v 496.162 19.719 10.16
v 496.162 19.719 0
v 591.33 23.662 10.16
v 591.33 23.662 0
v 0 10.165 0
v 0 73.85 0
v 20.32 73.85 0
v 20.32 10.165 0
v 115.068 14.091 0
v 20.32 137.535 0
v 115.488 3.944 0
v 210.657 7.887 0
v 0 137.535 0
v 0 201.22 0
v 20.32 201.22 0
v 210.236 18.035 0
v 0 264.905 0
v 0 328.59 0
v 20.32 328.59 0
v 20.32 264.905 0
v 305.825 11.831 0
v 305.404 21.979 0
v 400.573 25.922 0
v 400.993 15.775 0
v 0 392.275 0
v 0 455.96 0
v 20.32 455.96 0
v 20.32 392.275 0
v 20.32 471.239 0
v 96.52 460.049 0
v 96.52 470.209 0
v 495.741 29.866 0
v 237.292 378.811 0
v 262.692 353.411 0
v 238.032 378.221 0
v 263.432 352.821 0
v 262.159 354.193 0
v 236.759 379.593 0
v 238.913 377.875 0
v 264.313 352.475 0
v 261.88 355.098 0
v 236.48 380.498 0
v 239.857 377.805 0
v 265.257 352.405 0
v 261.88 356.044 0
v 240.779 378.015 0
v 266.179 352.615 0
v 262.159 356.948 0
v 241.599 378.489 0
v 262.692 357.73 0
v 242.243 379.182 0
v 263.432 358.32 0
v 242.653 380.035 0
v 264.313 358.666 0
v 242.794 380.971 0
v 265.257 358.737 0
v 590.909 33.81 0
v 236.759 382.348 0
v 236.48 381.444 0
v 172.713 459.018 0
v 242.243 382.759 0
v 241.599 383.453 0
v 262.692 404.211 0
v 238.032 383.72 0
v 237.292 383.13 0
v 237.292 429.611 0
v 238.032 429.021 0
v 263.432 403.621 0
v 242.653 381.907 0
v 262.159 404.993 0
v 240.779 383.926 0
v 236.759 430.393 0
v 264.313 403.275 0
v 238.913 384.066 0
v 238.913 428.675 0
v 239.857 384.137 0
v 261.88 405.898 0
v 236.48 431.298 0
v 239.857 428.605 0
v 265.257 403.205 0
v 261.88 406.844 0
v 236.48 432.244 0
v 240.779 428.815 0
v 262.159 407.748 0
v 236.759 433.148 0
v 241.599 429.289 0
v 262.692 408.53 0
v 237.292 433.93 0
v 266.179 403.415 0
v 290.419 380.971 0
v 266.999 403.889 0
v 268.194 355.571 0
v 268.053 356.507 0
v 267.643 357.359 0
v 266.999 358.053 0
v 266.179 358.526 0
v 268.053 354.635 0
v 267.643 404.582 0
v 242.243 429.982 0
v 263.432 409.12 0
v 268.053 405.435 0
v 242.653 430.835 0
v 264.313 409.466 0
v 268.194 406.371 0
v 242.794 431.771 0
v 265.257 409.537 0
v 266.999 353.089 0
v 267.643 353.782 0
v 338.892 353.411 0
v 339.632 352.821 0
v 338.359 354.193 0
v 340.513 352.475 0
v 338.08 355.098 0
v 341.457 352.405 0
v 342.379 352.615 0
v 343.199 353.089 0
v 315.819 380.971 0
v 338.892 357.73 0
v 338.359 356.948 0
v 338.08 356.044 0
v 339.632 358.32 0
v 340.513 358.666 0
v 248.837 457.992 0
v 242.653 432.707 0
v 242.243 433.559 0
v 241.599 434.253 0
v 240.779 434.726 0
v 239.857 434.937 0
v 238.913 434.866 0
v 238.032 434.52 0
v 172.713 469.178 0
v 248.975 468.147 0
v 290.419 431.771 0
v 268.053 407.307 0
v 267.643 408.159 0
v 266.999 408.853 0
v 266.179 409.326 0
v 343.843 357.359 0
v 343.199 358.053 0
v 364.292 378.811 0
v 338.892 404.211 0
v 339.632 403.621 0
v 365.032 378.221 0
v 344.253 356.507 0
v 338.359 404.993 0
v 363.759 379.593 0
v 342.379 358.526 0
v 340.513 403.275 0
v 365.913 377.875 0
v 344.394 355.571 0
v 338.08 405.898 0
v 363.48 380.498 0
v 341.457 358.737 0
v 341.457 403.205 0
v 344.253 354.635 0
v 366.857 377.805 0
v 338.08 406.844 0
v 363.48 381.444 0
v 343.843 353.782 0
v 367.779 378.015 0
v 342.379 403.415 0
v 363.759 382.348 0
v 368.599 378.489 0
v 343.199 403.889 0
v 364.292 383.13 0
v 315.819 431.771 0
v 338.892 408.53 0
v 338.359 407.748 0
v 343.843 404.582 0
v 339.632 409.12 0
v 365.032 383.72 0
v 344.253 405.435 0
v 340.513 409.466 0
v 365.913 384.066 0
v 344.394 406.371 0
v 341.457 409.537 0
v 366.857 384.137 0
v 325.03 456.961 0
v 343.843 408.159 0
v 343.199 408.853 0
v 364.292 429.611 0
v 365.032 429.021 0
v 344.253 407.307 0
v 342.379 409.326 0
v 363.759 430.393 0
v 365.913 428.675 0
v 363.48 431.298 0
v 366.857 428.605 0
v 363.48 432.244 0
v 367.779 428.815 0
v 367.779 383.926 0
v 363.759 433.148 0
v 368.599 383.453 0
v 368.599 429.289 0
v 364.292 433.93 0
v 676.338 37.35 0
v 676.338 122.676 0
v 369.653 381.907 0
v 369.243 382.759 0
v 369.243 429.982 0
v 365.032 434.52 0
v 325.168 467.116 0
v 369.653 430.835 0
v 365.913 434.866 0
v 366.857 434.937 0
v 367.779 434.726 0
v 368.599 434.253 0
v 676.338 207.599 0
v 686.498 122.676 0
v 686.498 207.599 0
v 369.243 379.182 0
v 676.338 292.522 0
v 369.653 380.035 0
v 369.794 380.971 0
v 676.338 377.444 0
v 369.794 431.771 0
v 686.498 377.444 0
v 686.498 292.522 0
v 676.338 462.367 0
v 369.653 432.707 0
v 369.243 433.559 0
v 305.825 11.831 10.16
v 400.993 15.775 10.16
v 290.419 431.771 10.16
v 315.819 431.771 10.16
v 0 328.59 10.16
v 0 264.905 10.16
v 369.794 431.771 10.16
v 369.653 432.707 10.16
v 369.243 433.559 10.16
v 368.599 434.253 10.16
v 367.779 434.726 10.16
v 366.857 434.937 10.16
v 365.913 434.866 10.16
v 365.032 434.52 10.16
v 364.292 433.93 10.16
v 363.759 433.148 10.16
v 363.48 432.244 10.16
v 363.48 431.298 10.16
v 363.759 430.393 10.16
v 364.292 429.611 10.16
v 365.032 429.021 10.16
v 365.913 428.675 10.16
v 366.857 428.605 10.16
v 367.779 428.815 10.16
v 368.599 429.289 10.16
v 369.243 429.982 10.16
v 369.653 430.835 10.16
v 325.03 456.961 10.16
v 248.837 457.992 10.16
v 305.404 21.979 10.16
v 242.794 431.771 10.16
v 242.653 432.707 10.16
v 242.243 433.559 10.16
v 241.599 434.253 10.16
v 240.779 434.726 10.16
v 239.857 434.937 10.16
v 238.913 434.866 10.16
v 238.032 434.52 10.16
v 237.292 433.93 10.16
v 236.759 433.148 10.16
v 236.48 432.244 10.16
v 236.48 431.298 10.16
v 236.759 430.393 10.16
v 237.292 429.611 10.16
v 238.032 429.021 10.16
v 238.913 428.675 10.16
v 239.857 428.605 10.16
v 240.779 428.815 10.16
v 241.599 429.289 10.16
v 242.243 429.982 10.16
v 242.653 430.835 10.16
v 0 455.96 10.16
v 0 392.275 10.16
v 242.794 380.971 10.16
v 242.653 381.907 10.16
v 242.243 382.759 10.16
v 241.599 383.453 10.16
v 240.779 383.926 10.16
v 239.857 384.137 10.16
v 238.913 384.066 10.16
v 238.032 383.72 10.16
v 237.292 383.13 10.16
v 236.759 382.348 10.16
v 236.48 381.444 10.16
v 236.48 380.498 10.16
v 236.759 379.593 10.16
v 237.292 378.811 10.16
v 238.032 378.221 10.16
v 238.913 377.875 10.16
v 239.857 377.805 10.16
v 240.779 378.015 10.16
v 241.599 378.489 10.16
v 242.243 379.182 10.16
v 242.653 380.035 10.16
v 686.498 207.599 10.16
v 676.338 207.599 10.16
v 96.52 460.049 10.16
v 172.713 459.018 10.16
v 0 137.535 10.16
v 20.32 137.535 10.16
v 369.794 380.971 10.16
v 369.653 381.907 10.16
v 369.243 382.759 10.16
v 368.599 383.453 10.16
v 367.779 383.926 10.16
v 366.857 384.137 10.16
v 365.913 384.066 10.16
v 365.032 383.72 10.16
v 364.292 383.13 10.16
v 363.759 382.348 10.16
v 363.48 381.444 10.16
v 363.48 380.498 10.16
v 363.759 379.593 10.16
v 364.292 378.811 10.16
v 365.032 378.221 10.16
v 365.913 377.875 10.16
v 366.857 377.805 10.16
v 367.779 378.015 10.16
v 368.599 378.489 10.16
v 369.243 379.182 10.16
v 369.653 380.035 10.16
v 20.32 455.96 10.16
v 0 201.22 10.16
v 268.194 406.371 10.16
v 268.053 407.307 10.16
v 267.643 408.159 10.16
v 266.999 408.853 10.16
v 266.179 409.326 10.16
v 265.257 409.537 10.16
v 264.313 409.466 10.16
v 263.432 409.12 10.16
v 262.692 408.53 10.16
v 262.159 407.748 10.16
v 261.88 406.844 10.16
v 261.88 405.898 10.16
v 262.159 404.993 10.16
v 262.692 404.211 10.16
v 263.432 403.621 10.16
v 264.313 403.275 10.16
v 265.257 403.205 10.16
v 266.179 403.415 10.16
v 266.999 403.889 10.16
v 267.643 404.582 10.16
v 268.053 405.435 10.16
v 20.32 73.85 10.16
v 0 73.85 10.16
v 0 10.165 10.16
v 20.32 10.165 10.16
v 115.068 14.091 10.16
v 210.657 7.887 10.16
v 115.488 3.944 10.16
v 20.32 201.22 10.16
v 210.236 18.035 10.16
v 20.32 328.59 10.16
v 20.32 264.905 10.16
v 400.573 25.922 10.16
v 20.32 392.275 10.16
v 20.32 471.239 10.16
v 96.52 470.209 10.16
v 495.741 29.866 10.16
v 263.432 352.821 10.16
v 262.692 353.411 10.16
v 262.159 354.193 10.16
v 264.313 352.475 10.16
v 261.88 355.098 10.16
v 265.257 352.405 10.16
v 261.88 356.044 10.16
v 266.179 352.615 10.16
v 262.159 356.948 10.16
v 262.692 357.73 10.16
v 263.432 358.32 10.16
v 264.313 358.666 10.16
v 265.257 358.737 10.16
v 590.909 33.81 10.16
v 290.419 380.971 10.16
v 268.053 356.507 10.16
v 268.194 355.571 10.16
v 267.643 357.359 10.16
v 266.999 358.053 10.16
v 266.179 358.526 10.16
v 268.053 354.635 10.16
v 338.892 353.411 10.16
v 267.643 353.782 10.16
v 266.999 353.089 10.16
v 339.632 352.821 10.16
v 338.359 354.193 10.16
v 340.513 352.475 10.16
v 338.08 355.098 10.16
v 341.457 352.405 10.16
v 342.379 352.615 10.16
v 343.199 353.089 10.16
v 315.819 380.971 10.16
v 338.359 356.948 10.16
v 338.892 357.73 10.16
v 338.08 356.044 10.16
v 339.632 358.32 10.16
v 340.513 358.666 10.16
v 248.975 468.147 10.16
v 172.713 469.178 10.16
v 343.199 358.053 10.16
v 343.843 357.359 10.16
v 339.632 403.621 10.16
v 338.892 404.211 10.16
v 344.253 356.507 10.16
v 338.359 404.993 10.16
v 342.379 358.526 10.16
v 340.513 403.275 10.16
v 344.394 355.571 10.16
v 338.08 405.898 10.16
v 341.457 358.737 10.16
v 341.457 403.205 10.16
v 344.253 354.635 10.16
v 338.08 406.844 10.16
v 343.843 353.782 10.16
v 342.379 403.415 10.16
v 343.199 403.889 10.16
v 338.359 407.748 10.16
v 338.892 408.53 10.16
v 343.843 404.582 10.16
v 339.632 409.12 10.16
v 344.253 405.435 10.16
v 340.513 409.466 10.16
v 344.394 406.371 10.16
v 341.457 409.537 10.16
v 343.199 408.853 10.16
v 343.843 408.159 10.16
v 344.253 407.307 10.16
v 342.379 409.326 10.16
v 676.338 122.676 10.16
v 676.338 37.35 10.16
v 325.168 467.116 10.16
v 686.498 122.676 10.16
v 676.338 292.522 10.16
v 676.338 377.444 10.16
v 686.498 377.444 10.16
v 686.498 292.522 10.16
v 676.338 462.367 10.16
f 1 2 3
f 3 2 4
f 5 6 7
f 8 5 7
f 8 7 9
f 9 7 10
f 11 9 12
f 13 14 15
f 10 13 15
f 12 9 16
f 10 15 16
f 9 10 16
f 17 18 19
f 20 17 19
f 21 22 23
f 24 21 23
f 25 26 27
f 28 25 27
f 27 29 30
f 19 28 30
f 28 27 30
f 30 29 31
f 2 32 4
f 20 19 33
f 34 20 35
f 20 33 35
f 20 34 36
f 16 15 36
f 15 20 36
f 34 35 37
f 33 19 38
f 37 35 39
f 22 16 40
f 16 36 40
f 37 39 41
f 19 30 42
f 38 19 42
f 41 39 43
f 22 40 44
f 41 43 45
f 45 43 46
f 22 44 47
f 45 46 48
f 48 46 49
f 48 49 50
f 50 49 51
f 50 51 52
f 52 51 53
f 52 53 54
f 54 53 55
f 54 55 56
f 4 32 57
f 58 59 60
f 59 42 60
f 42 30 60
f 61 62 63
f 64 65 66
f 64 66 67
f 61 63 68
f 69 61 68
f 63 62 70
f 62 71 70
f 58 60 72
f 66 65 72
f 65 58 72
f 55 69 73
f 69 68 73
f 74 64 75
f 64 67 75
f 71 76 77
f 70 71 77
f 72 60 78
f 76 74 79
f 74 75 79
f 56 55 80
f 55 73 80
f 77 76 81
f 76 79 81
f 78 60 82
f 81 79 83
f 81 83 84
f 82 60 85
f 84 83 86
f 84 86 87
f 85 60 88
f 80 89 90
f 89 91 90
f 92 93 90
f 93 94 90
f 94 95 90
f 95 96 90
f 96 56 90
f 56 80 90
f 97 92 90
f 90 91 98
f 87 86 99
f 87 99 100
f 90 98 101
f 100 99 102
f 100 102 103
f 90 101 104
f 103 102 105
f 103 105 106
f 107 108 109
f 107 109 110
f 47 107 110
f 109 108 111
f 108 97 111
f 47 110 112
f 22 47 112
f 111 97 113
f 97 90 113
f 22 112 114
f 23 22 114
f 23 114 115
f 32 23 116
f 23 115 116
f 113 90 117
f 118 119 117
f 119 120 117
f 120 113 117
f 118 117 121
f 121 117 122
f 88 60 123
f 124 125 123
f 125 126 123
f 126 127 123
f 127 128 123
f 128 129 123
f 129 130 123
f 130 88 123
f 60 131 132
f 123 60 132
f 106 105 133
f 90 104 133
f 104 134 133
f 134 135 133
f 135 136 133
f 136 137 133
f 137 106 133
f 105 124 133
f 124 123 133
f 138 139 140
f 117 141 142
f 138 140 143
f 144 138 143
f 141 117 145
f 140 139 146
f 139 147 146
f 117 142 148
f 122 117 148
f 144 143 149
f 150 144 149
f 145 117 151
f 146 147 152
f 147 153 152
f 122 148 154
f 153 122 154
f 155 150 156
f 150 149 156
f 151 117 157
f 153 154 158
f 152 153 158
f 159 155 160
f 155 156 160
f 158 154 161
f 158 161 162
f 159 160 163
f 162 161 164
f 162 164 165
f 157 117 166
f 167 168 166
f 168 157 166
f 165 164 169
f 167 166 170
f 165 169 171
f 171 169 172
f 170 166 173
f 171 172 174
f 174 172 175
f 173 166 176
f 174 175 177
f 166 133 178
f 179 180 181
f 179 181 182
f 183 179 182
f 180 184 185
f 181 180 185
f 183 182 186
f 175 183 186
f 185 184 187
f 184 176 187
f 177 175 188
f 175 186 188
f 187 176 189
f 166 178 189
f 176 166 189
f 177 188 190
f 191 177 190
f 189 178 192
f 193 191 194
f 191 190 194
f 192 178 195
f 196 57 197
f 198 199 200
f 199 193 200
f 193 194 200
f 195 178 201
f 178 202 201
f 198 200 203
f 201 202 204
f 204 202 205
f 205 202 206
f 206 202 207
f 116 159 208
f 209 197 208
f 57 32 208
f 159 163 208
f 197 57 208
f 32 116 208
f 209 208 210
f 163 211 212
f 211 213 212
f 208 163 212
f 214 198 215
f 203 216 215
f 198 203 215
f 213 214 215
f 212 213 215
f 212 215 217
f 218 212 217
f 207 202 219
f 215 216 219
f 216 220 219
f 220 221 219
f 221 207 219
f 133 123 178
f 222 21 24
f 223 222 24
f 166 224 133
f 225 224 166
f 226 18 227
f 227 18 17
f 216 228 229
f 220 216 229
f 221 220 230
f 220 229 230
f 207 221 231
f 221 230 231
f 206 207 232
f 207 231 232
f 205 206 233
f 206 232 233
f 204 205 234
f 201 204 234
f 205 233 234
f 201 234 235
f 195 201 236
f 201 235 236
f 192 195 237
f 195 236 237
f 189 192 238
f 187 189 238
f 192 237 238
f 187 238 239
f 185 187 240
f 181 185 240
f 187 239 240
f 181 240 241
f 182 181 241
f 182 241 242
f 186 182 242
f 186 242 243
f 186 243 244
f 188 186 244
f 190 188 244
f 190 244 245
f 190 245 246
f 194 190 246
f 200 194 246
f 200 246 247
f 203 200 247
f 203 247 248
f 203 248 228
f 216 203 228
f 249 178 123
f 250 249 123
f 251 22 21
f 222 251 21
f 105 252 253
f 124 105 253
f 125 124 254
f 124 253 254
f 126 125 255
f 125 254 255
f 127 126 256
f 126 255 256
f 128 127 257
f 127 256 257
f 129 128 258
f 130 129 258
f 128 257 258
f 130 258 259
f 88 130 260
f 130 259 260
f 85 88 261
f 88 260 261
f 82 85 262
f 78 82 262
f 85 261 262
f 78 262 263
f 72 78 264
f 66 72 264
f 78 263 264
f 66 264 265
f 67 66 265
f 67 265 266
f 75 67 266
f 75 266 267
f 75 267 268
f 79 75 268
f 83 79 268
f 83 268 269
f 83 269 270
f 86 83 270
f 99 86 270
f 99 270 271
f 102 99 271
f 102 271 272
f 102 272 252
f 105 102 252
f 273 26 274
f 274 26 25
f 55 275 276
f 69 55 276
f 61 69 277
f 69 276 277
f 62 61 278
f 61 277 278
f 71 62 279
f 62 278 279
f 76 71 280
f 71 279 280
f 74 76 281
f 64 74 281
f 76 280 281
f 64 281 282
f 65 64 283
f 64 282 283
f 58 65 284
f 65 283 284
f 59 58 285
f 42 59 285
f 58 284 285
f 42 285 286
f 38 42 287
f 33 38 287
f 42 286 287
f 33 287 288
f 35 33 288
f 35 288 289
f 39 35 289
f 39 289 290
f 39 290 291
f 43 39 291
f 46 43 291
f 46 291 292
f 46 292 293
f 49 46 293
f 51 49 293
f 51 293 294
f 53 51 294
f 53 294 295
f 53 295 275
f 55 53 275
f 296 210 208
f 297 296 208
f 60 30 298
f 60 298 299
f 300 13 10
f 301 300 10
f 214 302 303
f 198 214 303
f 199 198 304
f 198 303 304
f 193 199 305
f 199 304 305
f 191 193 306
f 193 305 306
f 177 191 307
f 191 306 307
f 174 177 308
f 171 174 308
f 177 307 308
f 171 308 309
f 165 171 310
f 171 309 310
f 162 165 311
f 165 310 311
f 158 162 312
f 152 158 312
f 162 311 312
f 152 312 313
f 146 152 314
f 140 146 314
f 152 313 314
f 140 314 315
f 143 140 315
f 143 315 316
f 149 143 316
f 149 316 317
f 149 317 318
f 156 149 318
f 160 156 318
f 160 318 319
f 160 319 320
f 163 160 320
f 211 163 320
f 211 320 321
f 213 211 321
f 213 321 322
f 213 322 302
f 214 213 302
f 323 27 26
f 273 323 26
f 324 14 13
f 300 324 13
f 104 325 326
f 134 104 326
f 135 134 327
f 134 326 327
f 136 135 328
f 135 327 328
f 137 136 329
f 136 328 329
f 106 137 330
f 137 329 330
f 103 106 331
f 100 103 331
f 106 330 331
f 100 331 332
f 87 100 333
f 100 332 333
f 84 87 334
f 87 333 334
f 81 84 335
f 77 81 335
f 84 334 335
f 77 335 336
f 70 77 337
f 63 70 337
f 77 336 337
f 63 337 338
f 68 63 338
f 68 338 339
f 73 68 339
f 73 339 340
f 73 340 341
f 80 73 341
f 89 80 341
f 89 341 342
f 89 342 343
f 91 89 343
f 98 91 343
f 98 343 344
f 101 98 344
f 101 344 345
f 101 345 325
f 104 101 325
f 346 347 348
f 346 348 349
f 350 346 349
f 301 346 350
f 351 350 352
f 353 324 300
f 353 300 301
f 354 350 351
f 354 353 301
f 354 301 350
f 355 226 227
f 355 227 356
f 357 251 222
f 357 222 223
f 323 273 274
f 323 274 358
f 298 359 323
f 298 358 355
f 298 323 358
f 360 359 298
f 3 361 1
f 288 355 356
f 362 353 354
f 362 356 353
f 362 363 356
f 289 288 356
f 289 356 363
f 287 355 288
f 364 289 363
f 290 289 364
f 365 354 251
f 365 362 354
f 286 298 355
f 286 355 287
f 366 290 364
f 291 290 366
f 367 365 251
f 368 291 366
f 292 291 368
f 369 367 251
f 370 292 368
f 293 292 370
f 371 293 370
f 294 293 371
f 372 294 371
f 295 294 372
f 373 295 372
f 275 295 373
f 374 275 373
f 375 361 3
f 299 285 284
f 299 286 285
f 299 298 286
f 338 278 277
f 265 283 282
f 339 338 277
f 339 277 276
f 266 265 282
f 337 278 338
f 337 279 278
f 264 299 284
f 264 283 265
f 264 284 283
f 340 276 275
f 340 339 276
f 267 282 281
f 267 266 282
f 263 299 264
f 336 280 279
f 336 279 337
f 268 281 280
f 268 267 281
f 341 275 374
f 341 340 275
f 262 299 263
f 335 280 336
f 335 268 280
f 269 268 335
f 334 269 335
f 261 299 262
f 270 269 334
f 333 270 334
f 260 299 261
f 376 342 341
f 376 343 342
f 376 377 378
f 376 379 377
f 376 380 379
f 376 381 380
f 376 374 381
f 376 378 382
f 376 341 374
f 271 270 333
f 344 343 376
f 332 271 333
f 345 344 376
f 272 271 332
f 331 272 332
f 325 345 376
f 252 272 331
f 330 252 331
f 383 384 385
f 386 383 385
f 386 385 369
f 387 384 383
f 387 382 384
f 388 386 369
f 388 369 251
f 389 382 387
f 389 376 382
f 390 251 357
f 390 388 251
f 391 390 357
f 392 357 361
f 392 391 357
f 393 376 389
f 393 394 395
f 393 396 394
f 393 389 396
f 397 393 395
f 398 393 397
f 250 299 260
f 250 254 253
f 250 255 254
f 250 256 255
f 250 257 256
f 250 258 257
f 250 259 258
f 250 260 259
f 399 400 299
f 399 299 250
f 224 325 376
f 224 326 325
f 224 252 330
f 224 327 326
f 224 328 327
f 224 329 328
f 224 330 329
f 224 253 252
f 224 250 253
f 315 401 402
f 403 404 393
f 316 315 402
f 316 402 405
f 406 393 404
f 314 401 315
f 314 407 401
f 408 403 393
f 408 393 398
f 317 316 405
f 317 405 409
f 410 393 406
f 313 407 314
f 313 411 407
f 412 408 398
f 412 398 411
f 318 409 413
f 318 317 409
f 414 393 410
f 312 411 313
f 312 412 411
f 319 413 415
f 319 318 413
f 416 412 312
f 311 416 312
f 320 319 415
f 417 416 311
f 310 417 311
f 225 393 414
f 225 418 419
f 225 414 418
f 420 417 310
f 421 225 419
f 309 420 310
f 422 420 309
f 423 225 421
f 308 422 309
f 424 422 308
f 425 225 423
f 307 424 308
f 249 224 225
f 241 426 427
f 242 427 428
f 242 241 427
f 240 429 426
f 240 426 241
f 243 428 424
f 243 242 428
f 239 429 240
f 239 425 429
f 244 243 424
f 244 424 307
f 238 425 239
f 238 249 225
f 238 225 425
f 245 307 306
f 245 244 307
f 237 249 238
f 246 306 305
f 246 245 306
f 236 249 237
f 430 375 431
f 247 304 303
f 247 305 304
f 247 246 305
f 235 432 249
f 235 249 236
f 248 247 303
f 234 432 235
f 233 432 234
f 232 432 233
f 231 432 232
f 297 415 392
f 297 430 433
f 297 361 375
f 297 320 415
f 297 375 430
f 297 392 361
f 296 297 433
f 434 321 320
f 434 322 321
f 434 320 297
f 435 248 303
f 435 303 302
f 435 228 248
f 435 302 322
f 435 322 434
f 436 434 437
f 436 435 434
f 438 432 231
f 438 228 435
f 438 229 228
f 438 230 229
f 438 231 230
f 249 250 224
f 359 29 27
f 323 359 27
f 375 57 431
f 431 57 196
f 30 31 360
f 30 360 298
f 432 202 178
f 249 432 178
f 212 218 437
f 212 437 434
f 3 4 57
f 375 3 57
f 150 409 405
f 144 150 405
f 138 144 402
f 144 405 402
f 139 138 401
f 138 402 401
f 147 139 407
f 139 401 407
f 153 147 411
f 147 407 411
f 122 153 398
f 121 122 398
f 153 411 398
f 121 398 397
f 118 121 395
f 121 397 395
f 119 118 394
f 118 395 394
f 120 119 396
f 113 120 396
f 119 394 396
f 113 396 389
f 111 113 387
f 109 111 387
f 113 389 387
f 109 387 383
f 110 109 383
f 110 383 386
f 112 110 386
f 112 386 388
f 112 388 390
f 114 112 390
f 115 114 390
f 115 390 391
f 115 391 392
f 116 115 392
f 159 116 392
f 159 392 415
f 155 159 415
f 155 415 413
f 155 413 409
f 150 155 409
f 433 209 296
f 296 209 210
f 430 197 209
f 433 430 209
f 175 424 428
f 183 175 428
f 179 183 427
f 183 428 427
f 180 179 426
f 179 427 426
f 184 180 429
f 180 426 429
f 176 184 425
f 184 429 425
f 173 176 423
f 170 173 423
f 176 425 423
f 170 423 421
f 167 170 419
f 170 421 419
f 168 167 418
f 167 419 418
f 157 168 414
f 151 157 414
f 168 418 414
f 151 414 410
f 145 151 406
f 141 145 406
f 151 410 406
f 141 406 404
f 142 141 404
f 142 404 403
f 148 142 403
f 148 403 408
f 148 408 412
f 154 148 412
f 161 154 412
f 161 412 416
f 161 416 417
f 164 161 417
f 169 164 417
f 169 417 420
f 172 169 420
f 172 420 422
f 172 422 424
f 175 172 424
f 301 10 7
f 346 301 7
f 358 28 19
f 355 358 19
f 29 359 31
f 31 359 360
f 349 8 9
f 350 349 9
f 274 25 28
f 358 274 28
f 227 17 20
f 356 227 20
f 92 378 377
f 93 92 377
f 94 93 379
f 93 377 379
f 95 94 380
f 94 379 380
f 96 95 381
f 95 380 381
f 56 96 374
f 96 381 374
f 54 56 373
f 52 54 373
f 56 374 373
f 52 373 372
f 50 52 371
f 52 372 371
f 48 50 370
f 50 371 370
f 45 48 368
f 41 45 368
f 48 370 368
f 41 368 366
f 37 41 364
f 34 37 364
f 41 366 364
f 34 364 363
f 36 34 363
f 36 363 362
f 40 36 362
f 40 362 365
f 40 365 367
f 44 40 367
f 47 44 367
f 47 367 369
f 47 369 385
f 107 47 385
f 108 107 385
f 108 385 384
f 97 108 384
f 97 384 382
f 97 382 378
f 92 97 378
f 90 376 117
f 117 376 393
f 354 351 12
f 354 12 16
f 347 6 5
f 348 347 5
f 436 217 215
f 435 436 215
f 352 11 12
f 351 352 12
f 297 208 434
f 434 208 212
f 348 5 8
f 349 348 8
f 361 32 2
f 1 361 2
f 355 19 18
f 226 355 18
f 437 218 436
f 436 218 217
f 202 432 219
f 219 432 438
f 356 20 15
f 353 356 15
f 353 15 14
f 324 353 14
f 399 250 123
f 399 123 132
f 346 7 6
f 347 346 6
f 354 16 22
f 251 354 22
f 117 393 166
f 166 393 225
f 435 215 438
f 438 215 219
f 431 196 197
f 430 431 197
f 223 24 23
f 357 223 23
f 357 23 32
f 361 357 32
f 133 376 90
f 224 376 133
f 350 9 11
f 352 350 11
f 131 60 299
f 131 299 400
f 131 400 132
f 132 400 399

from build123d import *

# Parameters (mm, degrees)
BOSS_EXTRUDE1_DEPTH = 10.16
CUT_EXTRUDE1_DEPTH  = 11.16
SKETCH4_W           = 129.547530324
SKETCH4_H           = 444.037072
CUT_EXTRUDE3_DEPTH  = 11.16
SKETCH5_W           = 10.16
SKETCH5_H           = 84.922739191
CUT_EXTRUDE5_DEPTH  = 11.16
CUT_EXTRUDE6_DEPTH  = 11.16
SKETCH11_R          = 3.175
SKETCH11_W          = 25.4
SKETCH11_H          = 50.8
CUT_EXTRUDE8_DEPTH  = 11.16


with BuildPart() as part:
    # Sketch1 → Boss-Extrude1 (new body)
    with BuildSketch(Plane.XY):
        with BuildLine():
            Line((20.32, 73.849956434), (0, 73.849956434))
            Line((0, 73.849956434), (0, 10.164894956))
            Line((0, 10.164894956), (20.32, 10.164894956))
            Line((20.32, 10.164894956), (115.06781826, 14.091181531))
            Line((115.06781826, 14.091181531), (115.488322648, 3.943711998))
            Line((115.488322648, 3.943711998), (210.656645296, 7.887423995))
            Line((210.656645296, 7.887423995), (210.236140908, 18.034893528))
            Line((210.236140908, 18.034893528), (305.404463556, 21.978605526))
            Line((305.404463556, 21.978605526), (305.824967945, 11.831135993))
            Line((305.824967945, 11.831135993), (400.993290593, 15.77484799))
            Line((400.993290593, 15.77484799), (400.572786204, 25.922317523))
            Line((400.572786204, 25.922317523), (495.741108852, 29.866029521))
            Line((495.741108852, 29.866029521), (496.161613241, 19.718559988))
            Line((496.161613241, 19.718559988), (591.329935889, 23.662271985))
            Line((591.329935889, 23.662271985), (590.909431501, 33.809741518))
            Line((590.909431501, 33.809741518), (686.077754149, 37.753453516))
            Line((686.077754149, 37.753453516), (686.498258538, 27.605983983))
            Line((686.498258538, 27.605983983), (781.666581186, 31.54969598))
            Line((781.666581186, 31.54969598), (781.246076797, 41.697165514))
            Line((781.246076797, 41.697165514), (781.246076797, 471.95159927))
            ThreePointArc((781.246076797, 471.95159927), (401.049995582, 500.057636465), (20.32, 519.645386783))
            Line((20.32, 519.645386783), (20.32, 455.960325305))
            Line((20.32, 455.960325305), (0, 455.960325305))
            Line((0, 455.960325305), (0, 392.275263826))
            Line((0, 392.275263826), (20.32, 392.275263826))
            Line((20.32, 392.275263826), (20.32, 328.590202348))
            Line((20.32, 328.590202348), (0, 328.590202348))
            Line((0, 328.590202348), (0, 264.905140869))
            Line((0, 264.905140869), (20.32, 264.905140869))
            Line((20.32, 264.905140869), (20.32, 201.220079391))
            Line((20.32, 201.220079391), (0, 201.220079391))
            Line((0, 201.220079391), (0, 137.535017912))
            Line((0, 137.535017912), (20.32, 137.535017912))
            Line((20.32, 137.535017912), (20.32, 73.849956434))
        make_face()
    extrude(amount=BOSS_EXTRUDE1_DEPTH)

    # Sketch2 → Cut-Extrude1 (cut, through all)
    with BuildSketch(Plane.XY.offset(10.16)):
        Polygon((20.32, 471.23904919), (781.246076797, 460.948390721), (781.246076797, 535.017906983), (20.32, 535.017906983), align=None)
    extrude(amount=-CUT_EXTRUDE1_DEPTH, mode=Mode.SUBTRACT)

    # Sketch4 → Cut-Extrude3 (cut, through all)
    with BuildSketch(Plane(origin=(0, 0, 0), x_dir=(-1, 0, 0), z_dir=(0, 0, -1))):
        with Locations((-751.2720237, 249.624519983)):
            Rectangle(SKETCH4_W, SKETCH4_H)
    extrude(amount=-CUT_EXTRUDE3_DEPTH, mode=Mode.SUBTRACT)

    # Sketch5 → Cut-Extrude5 (cut, through all)
    with BuildSketch(Plane(origin=(0, 0, 0), x_dir=(-1, 0, 0), z_dir=(0, 0, -1))):
        Polygon((-686.498258538, 122.676192707), (-686.498258538, 37.753453516), (-686.077754149, 37.753453516), (-676.338258538, 37.753453516), (-676.338258538, 122.676192707), align=None)
        with Locations((-681.418258538, 250.060301493)):
            Rectangle(SKETCH5_W, SKETCH5_H)
        Polygon((-686.498258538, 462.229747042), (-686.498258538, 377.444410279), (-676.338258538, 377.444410279), (-676.338258538, 462.367149469), align=None)
        Polygon((-676.338258538, 37.349855295), (-686.077754149, 37.753453516), (-686.498258538, 27.605983983), (-686.498258538, 26.157835014), (-676.338258538, 26.157835014), align=None)
        Polygon((-686.077754149, 37.753453516), (-686.498258538, 37.753453516), (-686.498258538, 27.605983983), align=None)
        Polygon((-676.338258538, 37.753453516), (-686.077754149, 37.753453516), (-676.338258538, 37.349855295), align=None)
    extrude(amount=-CUT_EXTRUDE5_DEPTH, mode=Mode.SUBTRACT)

    # Sketch9 → Cut-Extrude6 (cut, through all)
    with BuildSketch(Plane(origin=(0, 0, 0), x_dir=(-1, 0, 0), z_dir=(0, 0, -1))):
        Polygon((-248.83741583, 457.991507139), (-248.974805694, 468.150578161), (-325.167838357, 467.12015418), (-325.030448493, 456.961083159), align=None)
        Polygon((-96.52, 470.208530984), (-96.52, 460.048530984), (-172.713032663, 459.018107004), (-172.713032663, 469.178107004), align=None)
    extrude(amount=-CUT_EXTRUDE6_DEPTH, mode=Mode.SUBTRACT)

    # Sketch11 → Cut-Extrude8 (cut, through all)
    with BuildSketch(Plane.XY.offset(10.16)):
        with Locations((366.619369126, 431.770831078)):
            Circle(SKETCH11_R)
        with Locations((366.619369126, 380.970831078)):
            Circle(SKETCH11_R)
        with Locations((239.619369126, 431.770831078)):
            Circle(SKETCH11_R)
        with Locations((239.619369126, 380.970831078)):
            Circle(SKETCH11_R)
        with Locations((265.019369126, 406.370831078)):
            Circle(SKETCH11_R)
        with Locations((341.219369126, 406.370831078)):
            Circle(SKETCH11_R)
        with Locations((265.019369126, 355.570831078)):
            Circle(SKETCH11_R)
        with Locations((341.219369126, 355.570831078)):
            Circle(SKETCH11_R)
        with Locations((303.119369126, 406.370831078)):
            Rectangle(SKETCH11_W, SKETCH11_H)
    extrude(amount=-CUT_EXTRUDE8_DEPTH, mode=Mode.SUBTRACT)


solid = part.part
